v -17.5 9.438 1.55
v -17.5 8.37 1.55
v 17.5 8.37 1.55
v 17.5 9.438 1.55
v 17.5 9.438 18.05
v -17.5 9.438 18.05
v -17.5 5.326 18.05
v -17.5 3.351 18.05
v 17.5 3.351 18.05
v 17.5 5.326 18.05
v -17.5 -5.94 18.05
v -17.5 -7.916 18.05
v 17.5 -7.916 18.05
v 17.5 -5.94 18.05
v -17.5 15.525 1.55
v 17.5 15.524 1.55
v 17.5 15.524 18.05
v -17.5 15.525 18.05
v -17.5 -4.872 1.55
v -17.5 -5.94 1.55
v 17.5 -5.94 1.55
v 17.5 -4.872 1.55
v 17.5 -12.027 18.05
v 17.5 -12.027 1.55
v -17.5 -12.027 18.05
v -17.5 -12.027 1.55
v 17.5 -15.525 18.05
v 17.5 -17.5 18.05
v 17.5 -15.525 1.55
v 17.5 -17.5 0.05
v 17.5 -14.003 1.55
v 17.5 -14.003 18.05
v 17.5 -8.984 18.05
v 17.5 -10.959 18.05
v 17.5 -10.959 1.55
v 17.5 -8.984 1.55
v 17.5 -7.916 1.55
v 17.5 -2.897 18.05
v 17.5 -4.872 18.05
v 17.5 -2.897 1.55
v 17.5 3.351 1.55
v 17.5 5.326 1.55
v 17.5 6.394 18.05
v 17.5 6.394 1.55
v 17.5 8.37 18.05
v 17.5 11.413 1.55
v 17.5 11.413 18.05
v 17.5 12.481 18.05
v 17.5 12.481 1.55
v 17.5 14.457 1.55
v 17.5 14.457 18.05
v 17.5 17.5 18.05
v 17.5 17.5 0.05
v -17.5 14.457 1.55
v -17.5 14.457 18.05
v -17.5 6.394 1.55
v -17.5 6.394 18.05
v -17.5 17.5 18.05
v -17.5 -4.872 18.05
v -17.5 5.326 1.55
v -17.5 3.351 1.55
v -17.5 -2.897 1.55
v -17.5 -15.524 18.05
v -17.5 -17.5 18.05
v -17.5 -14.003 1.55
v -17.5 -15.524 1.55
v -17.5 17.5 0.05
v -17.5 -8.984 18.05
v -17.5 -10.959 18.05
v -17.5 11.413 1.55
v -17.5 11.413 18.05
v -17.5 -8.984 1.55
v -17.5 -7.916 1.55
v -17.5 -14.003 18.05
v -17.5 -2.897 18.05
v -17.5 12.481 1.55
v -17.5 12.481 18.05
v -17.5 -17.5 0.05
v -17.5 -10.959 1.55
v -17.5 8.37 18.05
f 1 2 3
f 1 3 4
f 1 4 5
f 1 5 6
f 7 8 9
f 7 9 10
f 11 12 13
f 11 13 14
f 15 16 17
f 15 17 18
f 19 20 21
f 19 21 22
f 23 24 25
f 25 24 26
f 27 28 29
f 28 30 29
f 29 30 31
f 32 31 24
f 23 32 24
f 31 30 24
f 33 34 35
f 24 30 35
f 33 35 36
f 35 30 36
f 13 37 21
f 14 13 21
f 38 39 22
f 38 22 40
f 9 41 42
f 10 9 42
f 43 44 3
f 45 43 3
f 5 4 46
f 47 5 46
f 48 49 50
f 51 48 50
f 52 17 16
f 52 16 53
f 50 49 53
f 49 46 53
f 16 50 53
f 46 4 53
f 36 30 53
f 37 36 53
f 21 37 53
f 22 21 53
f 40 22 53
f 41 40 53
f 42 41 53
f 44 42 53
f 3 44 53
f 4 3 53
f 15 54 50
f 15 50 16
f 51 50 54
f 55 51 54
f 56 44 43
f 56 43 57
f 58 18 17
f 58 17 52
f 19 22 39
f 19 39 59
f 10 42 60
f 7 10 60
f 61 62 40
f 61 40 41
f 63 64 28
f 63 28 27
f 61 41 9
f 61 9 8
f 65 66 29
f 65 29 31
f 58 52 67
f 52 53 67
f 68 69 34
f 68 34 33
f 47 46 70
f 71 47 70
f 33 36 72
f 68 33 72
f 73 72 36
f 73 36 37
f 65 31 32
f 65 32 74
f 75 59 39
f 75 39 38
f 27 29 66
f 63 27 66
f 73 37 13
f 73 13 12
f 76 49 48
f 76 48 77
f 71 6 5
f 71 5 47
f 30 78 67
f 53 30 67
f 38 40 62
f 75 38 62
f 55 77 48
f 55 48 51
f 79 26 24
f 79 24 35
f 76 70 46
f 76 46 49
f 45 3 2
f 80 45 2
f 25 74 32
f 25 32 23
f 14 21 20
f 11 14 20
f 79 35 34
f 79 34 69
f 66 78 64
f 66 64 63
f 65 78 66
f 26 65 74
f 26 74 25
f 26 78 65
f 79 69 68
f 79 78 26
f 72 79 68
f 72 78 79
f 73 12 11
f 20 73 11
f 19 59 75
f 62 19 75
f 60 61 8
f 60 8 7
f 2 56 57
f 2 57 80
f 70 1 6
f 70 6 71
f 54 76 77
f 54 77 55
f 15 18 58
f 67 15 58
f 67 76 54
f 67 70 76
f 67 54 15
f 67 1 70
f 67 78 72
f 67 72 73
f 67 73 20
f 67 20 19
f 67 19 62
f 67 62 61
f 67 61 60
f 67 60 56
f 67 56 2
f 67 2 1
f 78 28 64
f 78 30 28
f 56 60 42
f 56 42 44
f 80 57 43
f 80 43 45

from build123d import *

# Parameters (mm, degrees)
BOX_W                = 35
BOX_H                = 35
BOX_DEPTH            = 1.5
BOX017_W             = 1.9755
BOX017_H             = 35
BOX017_DEPTH         = 16.5
BOX018_W             = 1.9755
BOX018_H             = 35
BOX018_DEPTH         = 16.5
BOX019_W             = 1.9755
BOX019_H             = 35
BOX019_DEPTH         = 16.5
BOX020_W             = 1.9755
BOX020_H             = 35
BOX020_DEPTH         = 16.5
BOX021_W             = 1.9755
BOX021_H             = 35
BOX021_DEPTH         = 16.5
BOX022_W             = 1.9755
BOX022_H             = 35
BOX022_DEPTH         = 16.5
BOX023_W             = 1.9755
BOX023_H             = 35
BOX023_DEPTH         = 16.5
BOX024_W             = 1.9755
BOX024_H             = 35
BOX024_DEPTH         = 16.5
BOX025_W             = 1.9755
BOX025_H             = 35
BOX025_DEPTH         = 16.5
BOX026_W             = 1.9755
BOX026_H             = 35
BOX026_DEPTH         = 16.5
BODY_PLACEMENT_ANGLE = 90


with BuildPart() as part:
    # Box → Box (join)
    with BuildSketch(Plane(origin=(-17.5, -17.5, 0), x_dir=(1, 0, 0), z_dir=(0, 0, 1))):
        with Locations((17.5, 17.5)):
            Rectangle(BOX_W, BOX_H)
    extrude(amount=BOX_DEPTH)

    # Box017 → Box017 (join)
    with BuildSketch(Plane(origin=(15.5245, -17.5, 1.5), x_dir=(1, 0, 0), z_dir=(0, 0, 1))):
        with Locations((0.98775, 17.5)):
            Rectangle(BOX017_W, BOX017_H)
    extrude(amount=BOX017_DEPTH)

    # Box018 → Box018 (join)
    with BuildSketch(Plane(origin=(12.481022, -17.5, 1.5), x_dir=(1, 0, 0), z_dir=(0, 0, 1))):
        with Locations((0.98775, 17.5)):
            Rectangle(BOX018_W, BOX018_H)
    extrude(amount=BOX018_DEPTH)

    # Box019 → Box019 (join)
    with BuildSketch(Plane(origin=(9.437544, -17.5, 1.5), x_dir=(1, 0, 0), z_dir=(0, 0, 1))):
        with Locations((0.98775, 17.5)):
            Rectangle(BOX019_W, BOX019_H)
    extrude(amount=BOX019_DEPTH)

    # Box020 → Box020 (join)
    with BuildSketch(Plane(origin=(6.394066, -17.5, 1.5), x_dir=(1, 0, 0), z_dir=(0, 0, 1))):
        with Locations((0.98775, 17.5)):
            Rectangle(BOX020_W, BOX020_H)
    extrude(amount=BOX020_DEPTH)

    # Box021 → Box021 (join)
    with BuildSketch(Plane(origin=(3.350588, -17.5, 1.5), x_dir=(1, 0, 0), z_dir=(0, 0, 1))):
        with Locations((0.98775, 17.5)):
            Rectangle(BOX021_W, BOX021_H)
    extrude(amount=BOX021_DEPTH)

    # Box022 → Box022 (join)
    with BuildSketch(Plane(origin=(-4.872327, -17.5, 1.5), x_dir=(1, 0, 0), z_dir=(0, 0, 1))):
        with Locations((0.98775, 17.5)):
            Rectangle(BOX022_W, BOX022_H)
    extrude(amount=BOX022_DEPTH)

    # Box023 → Box023 (join)
    with BuildSketch(Plane(origin=(-7.915805, -17.5, 1.5), x_dir=(1, 0, 0), z_dir=(0, 0, 1))):
        with Locations((0.98775, 17.5)):
            Rectangle(BOX023_W, BOX023_H)
    extrude(amount=BOX023_DEPTH)

    # Box024 → Box024 (join)
    with BuildSketch(Plane(origin=(-10.959283, -17.5, 1.5), x_dir=(1, 0, 0), z_dir=(0, 0, 1))):
        with Locations((0.98775, 17.5)):
            Rectangle(BOX024_W, BOX024_H)
    extrude(amount=BOX024_DEPTH)

    # Box025 → Box025 (join)
    with BuildSketch(Plane(origin=(-14.002761, -17.5, 1.5), x_dir=(1, 0, 0), z_dir=(0, 0, 1))):
        with Locations((0.98775, 17.5)):
            Rectangle(BOX025_W, BOX025_H)
    extrude(amount=BOX025_DEPTH)

    # Box026 → Box026 (join)
    with BuildSketch(Plane(origin=(-17.5, -17.5, 1.5), x_dir=(1, 0, 0), z_dir=(0, 0, 1))):
        with Locations((0.98775, 17.5)):
            Rectangle(BOX026_W, BOX026_H)
    extrude(amount=BOX026_DEPTH)


with BuildPart() as part_1:
    # Body placement: moved
    add(part.part.moved(Location((0, 0, 0.05))).rotate(Axis((0, 0, 0.05), (0, 0, 1)), BODY_PLACEMENT_ANGLE))


solid = part_1.part
